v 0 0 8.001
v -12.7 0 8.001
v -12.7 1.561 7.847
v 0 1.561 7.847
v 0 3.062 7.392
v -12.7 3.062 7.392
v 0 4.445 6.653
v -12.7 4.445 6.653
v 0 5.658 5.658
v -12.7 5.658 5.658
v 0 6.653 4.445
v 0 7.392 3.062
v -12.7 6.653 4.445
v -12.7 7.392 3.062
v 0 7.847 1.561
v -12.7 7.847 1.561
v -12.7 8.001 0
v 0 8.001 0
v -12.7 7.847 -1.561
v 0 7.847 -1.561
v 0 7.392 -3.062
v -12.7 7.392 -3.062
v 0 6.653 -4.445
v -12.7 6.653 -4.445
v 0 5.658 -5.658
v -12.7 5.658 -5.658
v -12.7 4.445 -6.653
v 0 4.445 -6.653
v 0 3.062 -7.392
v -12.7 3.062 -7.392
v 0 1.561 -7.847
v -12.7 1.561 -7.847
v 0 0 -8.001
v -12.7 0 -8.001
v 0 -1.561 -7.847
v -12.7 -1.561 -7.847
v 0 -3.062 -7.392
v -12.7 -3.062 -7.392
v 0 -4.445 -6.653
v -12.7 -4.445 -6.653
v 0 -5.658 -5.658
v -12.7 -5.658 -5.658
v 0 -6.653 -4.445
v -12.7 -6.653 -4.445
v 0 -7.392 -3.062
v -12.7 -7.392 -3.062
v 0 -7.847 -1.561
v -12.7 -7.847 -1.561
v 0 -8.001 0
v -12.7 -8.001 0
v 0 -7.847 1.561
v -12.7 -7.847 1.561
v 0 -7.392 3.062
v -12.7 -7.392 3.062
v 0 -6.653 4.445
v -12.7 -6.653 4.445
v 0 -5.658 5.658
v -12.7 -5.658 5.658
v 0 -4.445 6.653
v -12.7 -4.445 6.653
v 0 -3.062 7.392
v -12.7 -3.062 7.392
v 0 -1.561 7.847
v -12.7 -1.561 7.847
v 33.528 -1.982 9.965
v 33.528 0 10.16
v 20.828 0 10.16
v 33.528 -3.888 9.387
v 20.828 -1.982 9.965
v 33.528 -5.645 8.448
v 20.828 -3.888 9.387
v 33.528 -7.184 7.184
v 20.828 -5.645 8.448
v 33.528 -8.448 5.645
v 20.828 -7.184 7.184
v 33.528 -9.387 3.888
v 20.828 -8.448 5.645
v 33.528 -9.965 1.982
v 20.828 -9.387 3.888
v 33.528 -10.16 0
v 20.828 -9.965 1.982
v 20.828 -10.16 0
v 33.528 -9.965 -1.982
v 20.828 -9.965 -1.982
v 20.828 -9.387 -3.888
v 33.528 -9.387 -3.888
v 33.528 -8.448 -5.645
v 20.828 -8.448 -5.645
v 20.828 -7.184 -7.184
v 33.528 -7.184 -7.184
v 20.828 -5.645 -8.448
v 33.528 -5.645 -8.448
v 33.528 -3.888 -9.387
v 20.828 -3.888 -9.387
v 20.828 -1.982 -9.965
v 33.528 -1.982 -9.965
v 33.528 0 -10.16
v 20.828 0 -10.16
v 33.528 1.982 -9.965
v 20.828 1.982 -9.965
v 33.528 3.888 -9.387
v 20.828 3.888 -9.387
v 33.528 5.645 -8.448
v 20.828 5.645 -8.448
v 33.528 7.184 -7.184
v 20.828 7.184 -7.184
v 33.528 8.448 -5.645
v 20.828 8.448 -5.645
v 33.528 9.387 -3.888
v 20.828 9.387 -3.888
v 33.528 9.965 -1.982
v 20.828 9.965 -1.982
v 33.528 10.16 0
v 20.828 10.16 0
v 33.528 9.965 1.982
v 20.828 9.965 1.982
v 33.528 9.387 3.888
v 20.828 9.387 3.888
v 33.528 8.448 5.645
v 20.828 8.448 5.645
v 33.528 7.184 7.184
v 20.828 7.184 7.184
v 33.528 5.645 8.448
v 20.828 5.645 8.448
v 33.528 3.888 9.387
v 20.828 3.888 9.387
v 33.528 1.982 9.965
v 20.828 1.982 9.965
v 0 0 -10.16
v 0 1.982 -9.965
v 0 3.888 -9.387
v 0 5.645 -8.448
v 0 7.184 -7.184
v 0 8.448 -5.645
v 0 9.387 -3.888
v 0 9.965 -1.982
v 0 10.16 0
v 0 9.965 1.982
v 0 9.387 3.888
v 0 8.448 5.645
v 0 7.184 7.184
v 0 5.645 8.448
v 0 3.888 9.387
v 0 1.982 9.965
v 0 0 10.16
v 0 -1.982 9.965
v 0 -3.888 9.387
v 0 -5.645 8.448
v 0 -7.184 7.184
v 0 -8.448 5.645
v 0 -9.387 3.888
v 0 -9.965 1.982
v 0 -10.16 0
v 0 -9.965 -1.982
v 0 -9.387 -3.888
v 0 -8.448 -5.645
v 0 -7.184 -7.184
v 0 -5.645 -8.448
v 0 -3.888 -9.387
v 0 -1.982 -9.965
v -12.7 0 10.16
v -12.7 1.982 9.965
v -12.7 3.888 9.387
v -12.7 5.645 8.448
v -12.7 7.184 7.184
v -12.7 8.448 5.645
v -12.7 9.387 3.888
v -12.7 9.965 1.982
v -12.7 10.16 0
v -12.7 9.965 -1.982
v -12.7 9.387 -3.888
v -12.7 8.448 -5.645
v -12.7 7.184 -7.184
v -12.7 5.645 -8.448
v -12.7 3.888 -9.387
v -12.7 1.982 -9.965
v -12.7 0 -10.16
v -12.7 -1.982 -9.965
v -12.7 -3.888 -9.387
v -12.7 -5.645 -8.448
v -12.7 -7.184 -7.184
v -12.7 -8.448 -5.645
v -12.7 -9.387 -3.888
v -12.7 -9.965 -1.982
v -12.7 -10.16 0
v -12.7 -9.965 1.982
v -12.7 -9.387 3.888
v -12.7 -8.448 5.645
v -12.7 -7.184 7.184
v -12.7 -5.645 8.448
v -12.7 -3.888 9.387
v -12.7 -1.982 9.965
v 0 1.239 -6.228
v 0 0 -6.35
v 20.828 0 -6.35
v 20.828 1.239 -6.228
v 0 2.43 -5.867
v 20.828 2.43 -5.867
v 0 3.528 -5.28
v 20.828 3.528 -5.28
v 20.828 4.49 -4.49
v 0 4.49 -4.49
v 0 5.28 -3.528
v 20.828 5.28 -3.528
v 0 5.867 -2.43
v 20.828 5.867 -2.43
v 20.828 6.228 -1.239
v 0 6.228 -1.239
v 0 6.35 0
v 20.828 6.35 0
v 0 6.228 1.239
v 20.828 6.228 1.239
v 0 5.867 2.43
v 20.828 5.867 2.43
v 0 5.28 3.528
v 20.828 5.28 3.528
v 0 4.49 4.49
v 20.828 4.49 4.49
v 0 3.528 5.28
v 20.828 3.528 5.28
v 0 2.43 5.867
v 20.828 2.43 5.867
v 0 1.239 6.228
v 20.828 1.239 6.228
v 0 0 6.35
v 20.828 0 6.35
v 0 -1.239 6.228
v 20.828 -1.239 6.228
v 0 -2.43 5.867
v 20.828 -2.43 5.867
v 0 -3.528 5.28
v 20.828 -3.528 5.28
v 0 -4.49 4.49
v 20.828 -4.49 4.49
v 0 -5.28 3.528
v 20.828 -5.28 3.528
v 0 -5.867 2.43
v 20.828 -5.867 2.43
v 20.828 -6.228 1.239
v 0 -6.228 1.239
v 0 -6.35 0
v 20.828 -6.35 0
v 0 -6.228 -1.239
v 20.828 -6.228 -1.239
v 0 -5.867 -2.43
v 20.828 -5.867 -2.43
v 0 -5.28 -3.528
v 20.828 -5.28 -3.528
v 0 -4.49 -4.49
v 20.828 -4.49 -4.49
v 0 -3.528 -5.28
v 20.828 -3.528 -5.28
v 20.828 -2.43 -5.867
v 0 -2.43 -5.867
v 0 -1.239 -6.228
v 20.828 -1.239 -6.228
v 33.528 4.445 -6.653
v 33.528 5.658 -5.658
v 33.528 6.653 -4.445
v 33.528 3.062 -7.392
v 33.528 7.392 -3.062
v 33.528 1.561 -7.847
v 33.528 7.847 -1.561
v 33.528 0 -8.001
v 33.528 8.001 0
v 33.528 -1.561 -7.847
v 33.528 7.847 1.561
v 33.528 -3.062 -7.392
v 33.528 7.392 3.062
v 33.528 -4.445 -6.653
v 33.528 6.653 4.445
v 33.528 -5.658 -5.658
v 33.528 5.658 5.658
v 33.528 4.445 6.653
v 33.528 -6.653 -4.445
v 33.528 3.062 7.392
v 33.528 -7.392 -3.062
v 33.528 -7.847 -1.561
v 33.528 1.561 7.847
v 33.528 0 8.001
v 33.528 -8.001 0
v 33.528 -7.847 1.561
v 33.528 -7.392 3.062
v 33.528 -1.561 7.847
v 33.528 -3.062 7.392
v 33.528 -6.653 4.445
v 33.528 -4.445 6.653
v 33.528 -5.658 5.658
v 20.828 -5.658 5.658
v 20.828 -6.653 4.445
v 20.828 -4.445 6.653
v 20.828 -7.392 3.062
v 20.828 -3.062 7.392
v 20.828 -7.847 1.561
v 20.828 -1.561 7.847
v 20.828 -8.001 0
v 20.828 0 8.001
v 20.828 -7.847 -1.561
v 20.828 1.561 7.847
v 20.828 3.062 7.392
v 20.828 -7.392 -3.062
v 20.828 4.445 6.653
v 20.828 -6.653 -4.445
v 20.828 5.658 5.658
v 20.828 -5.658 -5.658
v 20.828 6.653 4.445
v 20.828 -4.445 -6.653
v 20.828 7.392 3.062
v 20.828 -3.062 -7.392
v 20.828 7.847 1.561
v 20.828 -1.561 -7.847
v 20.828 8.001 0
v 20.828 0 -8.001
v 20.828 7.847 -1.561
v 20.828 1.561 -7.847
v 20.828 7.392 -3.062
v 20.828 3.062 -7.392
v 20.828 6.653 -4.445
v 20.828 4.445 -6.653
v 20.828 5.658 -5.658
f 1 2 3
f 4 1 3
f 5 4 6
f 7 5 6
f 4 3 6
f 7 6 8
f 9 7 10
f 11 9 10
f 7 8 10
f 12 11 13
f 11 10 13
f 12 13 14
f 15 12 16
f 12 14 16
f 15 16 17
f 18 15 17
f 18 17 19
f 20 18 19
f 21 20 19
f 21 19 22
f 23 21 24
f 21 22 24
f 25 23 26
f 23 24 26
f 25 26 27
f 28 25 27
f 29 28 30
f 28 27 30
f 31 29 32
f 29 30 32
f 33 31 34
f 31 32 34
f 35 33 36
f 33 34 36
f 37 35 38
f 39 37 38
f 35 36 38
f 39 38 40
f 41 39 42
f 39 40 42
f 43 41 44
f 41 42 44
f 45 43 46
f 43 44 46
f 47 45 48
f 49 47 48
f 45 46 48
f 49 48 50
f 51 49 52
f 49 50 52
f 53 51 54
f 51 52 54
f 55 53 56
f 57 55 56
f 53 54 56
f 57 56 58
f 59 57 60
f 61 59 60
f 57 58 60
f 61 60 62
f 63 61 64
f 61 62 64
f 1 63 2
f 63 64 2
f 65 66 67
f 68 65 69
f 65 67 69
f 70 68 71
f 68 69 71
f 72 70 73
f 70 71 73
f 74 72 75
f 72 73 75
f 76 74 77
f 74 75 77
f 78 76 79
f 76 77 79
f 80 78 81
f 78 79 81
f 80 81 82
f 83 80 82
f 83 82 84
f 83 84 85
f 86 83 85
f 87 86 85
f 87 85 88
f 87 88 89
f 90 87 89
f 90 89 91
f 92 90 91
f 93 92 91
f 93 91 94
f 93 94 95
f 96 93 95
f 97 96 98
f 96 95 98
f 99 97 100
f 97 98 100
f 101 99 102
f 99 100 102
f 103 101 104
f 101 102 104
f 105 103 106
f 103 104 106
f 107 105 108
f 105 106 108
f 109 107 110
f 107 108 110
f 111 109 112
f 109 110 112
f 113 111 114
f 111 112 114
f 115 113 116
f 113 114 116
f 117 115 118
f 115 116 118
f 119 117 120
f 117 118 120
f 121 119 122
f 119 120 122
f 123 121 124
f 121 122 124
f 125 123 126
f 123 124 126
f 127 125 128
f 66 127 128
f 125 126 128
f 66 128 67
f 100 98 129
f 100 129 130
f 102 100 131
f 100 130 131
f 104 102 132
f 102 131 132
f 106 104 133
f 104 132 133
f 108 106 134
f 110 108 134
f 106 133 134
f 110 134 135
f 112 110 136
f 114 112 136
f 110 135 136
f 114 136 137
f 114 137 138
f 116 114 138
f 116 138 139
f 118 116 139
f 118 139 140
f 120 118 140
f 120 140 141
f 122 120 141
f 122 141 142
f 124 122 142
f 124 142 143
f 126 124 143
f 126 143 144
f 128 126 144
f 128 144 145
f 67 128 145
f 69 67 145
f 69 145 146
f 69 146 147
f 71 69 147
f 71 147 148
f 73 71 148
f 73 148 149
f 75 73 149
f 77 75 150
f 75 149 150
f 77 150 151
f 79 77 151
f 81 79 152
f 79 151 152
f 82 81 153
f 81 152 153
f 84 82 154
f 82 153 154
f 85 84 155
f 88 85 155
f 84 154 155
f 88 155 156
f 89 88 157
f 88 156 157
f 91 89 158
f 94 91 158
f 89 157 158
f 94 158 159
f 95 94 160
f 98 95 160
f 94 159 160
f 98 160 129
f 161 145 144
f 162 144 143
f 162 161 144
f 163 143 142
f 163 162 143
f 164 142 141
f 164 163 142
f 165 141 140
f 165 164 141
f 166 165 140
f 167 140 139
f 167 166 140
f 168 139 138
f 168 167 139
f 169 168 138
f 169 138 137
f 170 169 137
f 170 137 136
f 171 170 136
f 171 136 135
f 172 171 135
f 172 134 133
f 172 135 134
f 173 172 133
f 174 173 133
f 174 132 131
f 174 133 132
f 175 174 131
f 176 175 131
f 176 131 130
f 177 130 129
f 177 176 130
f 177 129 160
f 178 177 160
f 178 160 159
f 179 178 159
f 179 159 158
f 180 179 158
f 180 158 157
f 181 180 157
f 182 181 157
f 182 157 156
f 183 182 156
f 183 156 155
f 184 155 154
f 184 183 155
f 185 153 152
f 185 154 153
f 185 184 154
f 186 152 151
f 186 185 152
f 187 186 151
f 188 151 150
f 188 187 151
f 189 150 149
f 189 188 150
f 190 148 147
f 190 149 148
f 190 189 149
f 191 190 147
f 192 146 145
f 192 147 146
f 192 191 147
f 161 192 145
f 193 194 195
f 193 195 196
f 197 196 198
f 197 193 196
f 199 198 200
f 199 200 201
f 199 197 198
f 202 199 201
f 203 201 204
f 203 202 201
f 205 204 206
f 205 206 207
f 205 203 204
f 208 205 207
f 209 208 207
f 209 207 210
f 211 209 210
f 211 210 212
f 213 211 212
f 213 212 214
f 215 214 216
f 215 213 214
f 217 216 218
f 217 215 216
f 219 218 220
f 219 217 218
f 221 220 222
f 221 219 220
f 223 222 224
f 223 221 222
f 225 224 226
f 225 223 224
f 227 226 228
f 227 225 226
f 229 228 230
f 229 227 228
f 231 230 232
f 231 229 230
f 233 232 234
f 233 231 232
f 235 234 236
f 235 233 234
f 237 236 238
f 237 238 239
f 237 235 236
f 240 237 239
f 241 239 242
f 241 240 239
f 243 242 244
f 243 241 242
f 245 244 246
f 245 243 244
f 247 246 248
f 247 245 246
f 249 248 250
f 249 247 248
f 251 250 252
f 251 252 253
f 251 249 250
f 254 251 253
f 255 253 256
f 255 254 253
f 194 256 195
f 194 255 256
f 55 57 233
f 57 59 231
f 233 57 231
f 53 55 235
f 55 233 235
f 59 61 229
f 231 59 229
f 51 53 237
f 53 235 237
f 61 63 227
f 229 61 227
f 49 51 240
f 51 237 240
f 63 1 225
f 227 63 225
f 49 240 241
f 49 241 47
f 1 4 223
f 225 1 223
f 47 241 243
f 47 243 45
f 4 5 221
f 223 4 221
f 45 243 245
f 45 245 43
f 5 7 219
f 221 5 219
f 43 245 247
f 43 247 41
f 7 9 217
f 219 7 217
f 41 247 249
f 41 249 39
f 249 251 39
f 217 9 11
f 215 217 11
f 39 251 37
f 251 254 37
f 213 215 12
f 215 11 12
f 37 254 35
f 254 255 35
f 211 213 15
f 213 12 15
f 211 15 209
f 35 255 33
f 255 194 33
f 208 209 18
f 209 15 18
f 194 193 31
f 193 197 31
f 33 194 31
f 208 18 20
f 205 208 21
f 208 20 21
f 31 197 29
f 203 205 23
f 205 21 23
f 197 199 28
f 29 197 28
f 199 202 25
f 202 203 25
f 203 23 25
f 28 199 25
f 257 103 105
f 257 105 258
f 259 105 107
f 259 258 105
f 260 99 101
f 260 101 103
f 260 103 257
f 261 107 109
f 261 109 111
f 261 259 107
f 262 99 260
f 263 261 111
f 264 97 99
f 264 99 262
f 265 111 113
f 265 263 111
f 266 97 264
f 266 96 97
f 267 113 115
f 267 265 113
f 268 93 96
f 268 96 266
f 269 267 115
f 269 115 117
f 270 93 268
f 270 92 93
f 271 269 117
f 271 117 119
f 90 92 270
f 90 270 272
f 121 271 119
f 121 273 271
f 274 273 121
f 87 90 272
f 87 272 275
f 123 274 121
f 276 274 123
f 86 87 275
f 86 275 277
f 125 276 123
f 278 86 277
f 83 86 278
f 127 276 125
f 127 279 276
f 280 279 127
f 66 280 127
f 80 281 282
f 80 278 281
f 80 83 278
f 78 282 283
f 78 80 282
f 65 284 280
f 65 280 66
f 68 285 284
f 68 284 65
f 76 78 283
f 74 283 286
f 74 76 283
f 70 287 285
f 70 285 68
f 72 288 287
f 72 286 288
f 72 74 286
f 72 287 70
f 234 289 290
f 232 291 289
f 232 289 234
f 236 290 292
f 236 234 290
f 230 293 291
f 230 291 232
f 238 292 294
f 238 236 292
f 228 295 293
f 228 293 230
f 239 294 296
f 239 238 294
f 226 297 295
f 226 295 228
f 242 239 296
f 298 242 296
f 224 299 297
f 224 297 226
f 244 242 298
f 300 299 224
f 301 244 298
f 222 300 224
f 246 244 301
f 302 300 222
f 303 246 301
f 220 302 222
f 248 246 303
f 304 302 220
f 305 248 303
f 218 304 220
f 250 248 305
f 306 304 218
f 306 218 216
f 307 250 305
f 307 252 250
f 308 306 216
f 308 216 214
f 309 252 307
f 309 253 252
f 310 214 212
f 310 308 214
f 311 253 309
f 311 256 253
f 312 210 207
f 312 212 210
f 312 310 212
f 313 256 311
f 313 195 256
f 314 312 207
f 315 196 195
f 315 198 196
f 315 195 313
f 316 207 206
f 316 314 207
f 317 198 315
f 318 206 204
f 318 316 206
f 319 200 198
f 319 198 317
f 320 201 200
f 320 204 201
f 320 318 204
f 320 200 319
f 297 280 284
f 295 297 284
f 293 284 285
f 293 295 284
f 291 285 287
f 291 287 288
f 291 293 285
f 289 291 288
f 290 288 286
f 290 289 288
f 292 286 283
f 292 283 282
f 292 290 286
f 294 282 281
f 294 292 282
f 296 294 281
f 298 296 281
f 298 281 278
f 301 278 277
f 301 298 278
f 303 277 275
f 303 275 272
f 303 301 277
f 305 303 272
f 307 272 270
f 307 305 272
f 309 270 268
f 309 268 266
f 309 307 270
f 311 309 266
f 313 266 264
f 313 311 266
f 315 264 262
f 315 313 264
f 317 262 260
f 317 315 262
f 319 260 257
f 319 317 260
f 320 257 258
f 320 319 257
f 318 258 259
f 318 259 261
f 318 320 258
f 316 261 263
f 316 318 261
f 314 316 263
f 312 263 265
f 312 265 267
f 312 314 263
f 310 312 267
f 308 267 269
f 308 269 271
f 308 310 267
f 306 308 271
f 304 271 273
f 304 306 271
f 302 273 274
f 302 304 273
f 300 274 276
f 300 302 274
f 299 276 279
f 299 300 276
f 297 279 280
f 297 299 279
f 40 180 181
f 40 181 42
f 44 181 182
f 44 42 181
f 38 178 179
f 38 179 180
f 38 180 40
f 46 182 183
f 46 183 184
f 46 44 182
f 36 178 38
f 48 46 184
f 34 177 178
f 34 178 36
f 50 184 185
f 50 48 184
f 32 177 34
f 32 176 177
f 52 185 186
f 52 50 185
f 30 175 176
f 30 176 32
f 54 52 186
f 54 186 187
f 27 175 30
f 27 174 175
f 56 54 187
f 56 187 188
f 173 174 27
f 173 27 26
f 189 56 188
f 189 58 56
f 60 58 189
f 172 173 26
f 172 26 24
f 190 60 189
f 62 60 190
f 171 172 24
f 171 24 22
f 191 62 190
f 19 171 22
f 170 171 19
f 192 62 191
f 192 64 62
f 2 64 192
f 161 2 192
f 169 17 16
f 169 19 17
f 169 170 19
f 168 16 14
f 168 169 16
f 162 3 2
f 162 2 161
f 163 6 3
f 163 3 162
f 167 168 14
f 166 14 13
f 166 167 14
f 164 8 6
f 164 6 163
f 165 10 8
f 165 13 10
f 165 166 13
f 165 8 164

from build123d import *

# Parameters (mm, degrees)
SKETCH1_R           = 10.16
SKETCH1_R_2         = 6.35
BOSS_EXTRUDE2_DEPTH = 20.828
BOSS_EXTRUDE3_START = 12.7
SKETCH2_R           = 10.16
SKETCH2_R_2         = 8.001
BOSS_EXTRUDE3_DEPTH = 12.7
SKETCH3_R           = 10.16
SKETCH3_R_2         = 8.001
BOSS_EXTRUDE4_DEPTH = 12.7


with BuildPart() as part:
    # Sketch1 → Boss-Extrude2 (new body)
    with BuildSketch(Plane(origin=(0, 0, 0), x_dir=(0, 0, -1), z_dir=(1, 0, 0))):
        Circle(SKETCH1_R)
        Circle(SKETCH1_R_2, mode=Mode.SUBTRACT)
    extrude(amount=BOSS_EXTRUDE2_DEPTH)

    # Sketch2 → Boss-Extrude3 (add)
    with BuildSketch(Plane.ZY.offset(BOSS_EXTRUDE3_START)):
        Circle(SKETCH2_R)
        Circle(SKETCH2_R_2, mode=Mode.SUBTRACT)
    extrude(amount=-BOSS_EXTRUDE3_DEPTH)

    # Sketch3 → Boss-Extrude4 (add)
    with BuildSketch(Plane(origin=(20.828, 0, 0), x_dir=(0, 0, -1), z_dir=(1, 0, 0))):
        with Locations(Location((0, 0, 0), (0, 0, 180))):
            Circle(SKETCH3_R)
        with Locations(Location((0, 0, 0), (0, 0, 180))):
            Circle(SKETCH3_R_2, mode=Mode.SUBTRACT)
    extrude(amount=BOSS_EXTRUDE4_DEPTH)


solid = part.part
